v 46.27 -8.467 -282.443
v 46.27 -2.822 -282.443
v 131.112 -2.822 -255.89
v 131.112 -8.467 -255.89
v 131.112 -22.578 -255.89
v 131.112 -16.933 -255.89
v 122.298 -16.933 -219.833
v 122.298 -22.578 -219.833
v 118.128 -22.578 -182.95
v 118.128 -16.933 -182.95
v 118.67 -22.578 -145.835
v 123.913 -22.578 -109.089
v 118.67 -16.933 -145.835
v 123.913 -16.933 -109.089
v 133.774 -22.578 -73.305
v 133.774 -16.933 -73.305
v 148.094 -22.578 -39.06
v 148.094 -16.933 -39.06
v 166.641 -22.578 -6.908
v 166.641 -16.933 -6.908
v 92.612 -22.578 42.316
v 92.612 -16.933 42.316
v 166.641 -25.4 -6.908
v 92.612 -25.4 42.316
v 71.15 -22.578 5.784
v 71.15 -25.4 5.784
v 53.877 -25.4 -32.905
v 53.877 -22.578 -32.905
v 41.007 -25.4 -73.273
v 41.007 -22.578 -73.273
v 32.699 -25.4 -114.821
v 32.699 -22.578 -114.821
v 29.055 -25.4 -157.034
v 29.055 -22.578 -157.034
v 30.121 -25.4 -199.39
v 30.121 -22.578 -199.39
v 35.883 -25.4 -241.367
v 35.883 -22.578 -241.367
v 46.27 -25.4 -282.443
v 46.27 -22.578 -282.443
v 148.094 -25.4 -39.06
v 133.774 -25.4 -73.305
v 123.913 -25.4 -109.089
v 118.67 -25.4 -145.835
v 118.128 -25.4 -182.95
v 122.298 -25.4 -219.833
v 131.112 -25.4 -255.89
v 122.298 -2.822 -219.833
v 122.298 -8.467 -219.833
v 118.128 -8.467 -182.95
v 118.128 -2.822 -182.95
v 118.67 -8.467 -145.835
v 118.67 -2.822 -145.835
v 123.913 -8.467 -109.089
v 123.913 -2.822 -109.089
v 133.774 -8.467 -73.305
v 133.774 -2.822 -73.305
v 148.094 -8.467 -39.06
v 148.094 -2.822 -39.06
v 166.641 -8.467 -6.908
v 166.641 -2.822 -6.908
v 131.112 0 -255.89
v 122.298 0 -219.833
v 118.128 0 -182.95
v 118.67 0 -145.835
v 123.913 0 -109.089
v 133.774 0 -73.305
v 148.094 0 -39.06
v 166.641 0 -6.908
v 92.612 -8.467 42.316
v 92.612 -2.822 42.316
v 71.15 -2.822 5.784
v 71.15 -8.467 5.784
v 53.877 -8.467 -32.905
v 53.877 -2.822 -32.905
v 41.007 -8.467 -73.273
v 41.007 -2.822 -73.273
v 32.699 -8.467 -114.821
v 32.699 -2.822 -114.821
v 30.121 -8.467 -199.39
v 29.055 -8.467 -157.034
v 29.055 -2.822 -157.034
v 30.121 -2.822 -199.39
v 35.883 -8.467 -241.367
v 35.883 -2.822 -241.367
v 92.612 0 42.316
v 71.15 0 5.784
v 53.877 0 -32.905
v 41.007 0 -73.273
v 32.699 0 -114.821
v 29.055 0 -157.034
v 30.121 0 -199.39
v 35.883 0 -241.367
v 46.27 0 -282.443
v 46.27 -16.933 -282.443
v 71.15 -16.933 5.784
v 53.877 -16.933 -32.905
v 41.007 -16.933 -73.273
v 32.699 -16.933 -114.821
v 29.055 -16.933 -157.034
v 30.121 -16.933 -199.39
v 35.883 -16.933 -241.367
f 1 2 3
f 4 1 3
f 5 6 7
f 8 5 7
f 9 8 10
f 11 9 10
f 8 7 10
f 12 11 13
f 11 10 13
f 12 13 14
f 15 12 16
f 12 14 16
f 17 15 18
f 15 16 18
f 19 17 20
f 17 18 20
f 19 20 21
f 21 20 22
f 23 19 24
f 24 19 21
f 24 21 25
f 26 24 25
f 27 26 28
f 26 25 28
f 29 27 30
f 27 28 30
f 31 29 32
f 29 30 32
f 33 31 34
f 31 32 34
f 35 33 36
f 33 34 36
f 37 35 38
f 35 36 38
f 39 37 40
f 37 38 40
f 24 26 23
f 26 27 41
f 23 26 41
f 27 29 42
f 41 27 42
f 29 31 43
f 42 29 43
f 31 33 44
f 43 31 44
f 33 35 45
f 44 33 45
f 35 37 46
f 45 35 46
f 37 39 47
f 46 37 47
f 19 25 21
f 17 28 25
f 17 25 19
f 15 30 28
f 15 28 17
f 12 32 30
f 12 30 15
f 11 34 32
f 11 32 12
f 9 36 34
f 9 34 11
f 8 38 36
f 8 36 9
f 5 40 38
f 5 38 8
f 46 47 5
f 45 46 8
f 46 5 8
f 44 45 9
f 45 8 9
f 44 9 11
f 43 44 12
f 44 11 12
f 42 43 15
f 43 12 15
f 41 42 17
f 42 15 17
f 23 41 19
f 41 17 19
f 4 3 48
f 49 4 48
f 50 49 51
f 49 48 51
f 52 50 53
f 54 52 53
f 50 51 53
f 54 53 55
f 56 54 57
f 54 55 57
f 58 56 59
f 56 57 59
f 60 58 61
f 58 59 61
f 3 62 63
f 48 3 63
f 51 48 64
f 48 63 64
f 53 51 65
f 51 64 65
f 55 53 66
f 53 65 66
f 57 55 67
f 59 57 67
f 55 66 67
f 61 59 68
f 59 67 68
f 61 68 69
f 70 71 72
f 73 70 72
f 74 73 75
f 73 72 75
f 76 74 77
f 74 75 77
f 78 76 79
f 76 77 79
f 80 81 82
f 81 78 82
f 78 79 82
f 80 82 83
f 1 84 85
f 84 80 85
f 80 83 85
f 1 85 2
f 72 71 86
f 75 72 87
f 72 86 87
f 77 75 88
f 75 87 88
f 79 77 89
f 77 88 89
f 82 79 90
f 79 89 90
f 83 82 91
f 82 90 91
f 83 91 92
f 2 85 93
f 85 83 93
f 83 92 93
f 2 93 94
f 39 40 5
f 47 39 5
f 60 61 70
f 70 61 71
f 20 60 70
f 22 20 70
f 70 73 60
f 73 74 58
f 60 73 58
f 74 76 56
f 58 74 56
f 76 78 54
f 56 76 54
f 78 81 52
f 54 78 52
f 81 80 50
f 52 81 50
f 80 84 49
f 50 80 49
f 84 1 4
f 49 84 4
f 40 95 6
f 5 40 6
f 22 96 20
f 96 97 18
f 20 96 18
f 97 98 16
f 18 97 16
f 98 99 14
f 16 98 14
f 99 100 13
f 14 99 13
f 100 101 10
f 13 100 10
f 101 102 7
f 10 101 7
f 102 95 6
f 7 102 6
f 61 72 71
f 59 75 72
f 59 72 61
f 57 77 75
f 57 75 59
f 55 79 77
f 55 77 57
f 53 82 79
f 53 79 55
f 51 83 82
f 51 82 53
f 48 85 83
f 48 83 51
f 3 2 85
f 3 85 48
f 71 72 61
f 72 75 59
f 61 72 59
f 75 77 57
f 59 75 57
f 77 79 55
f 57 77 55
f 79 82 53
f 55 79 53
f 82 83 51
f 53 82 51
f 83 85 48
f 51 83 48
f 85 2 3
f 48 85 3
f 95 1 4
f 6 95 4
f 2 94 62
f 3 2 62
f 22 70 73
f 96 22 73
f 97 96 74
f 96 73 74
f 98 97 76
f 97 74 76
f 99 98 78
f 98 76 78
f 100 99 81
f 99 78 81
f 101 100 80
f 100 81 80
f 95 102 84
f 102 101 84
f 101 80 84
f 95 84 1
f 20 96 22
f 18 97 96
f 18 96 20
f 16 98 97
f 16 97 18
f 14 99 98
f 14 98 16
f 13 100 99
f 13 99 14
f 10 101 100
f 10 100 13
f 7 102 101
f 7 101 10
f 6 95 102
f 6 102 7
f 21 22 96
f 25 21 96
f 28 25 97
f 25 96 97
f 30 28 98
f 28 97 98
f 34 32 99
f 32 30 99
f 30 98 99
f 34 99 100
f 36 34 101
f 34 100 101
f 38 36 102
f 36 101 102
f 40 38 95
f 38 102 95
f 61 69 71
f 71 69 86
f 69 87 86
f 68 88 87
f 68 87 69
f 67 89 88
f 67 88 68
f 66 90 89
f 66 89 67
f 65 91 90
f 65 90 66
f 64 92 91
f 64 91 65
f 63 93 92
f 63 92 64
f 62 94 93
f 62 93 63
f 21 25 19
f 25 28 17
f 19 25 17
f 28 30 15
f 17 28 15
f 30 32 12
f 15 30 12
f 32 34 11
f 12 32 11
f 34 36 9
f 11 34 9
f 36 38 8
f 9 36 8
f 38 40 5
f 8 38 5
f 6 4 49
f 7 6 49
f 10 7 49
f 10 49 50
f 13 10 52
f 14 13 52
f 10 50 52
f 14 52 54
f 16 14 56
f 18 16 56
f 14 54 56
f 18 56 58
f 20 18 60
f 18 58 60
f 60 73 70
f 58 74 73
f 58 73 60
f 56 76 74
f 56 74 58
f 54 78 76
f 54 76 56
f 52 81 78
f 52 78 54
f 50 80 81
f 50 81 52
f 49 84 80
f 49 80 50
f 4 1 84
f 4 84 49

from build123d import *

# Parameters (mm, degrees)
SKETCH3_W                = 609.6
SKETCH3_H                = 1219.2
BOSS_EXTRUDE1_DEPTH      = 25.4
SPLIT1_SURFACE_1_1_BACK  = 1364.344
SPLIT1_SURFACE_1_1_DEPTH = 2728.688
SPLIT1_SURFACE_1_2_BACK  = 1364.344
SPLIT1_SURFACE_1_2_DEPTH = 2728.688
SPLIT1_SURFACE_2_3_BACK  = 1364.344
SPLIT1_SURFACE_2_3_DEPTH = 2728.688
SPLIT1_SURFACE_2_4_BACK  = 1364.344
SPLIT1_SURFACE_2_4_DEPTH = 2728.688
SPLIT1_SURFACE_3_5_BACK  = 1364.344
SPLIT1_SURFACE_3_5_DEPTH = 2728.688
SPLIT1_SURFACE_3_6_BACK  = 1364.344
SPLIT1_SURFACE_3_6_DEPTH = 2728.688
SPLIT1_SURFACE_4_7_BACK  = 1364.344
SPLIT1_SURFACE_4_7_DEPTH = 2728.688
SPLIT1_SURFACE_4_8_BACK  = 1364.344
SPLIT1_SURFACE_4_8_DEPTH = 2728.688
SKETCH6_W                = 609.6
SKETCH6_H                = 1219.2
CUT_EXTRUDE1_DEPTH       = 25.4


with BuildPart() as part:
    # Sketch3 → Boss-Extrude1 (new body)
    with BuildSketch(Plane(origin=(0, 0, 0), x_dir=(1, 0, 0), z_dir=(0, 1, 0))):
        Rectangle(SKETCH3_W, SKETCH3_H)
    extrude(amount=-BOSS_EXTRUDE1_DEPTH)


with BuildPart() as body_2:
    # Split1: the piece behind the surface
    add(part.part)
    # Split1 surface 1: a surface, the sketch's curves swept straight by 2728.688 mm
    with BuildLine(Plane.XY.offset(-SPLIT1_SURFACE_1_1_BACK), mode=Mode.PRIVATE) as split1_surface_1_1_path:
        Line((-335.28, -22.577777778), (335.28, -22.577777778))
    split1_surface_1_1 = Shell.extrude(split1_surface_1_1_path.wire(), (0 * SPLIT1_SURFACE_1_1_DEPTH, 0 * SPLIT1_SURFACE_1_1_DEPTH, 1 * SPLIT1_SURFACE_1_1_DEPTH))
    split(bisect_by=split1_surface_1_1, keep=Keep.BOTTOM)


with BuildPart() as part_1:
    add(part.part)

    # Split1: split by a surface, the side it looks to stays
    # Split1 surface 1: a surface, the sketch's curves swept straight by 2728.688 mm
    with BuildLine(Plane.XY.offset(-SPLIT1_SURFACE_1_2_BACK), mode=Mode.PRIVATE) as split1_surface_1_2_path:
        Line((-335.28, -22.577777778), (335.28, -22.577777778))
    split1_surface_1_2 = Shell.extrude(split1_surface_1_2_path.wire(), (0 * SPLIT1_SURFACE_1_2_DEPTH, 0 * SPLIT1_SURFACE_1_2_DEPTH, 1 * SPLIT1_SURFACE_1_2_DEPTH))
    split(bisect_by=split1_surface_1_2, keep=Keep.TOP)


with BuildPart() as body_3:
    # Split1 2: the piece behind the surface
    add(part_1.part)
    # Split1 surface 2: a surface, the sketch's curves swept straight by 2728.688 mm
    with BuildLine(Plane.XY.offset(-SPLIT1_SURFACE_2_3_BACK), mode=Mode.PRIVATE) as split1_surface_2_3_path:
        Line((-335.28, -16.933333333), (335.28, -16.933333333))
    split1_surface_2_3 = Shell.extrude(split1_surface_2_3_path.wire(), (0 * SPLIT1_SURFACE_2_3_DEPTH, 0 * SPLIT1_SURFACE_2_3_DEPTH, 1 * SPLIT1_SURFACE_2_3_DEPTH))
    split(bisect_by=split1_surface_2_3, keep=Keep.BOTTOM)


with BuildPart() as part_2:
    add(part_1.part)

    # Split1 2: split by a surface, the side it looks to stays
    # Split1 surface 2: a surface, the sketch's curves swept straight by 2728.688 mm
    with BuildLine(Plane.XY.offset(-SPLIT1_SURFACE_2_4_BACK), mode=Mode.PRIVATE) as split1_surface_2_4_path:
        Line((-335.28, -16.933333333), (335.28, -16.933333333))
    split1_surface_2_4 = Shell.extrude(split1_surface_2_4_path.wire(), (0 * SPLIT1_SURFACE_2_4_DEPTH, 0 * SPLIT1_SURFACE_2_4_DEPTH, 1 * SPLIT1_SURFACE_2_4_DEPTH))
    split(bisect_by=split1_surface_2_4, keep=Keep.TOP)


with BuildPart() as body_4_2:
    # Split1 3: the piece behind the surface
    add(part_2.part)
    # Split1 surface 3: a surface, the sketch's curves swept straight by 2728.688 mm
    with BuildLine(Plane.XY.offset(-SPLIT1_SURFACE_3_5_BACK), mode=Mode.PRIVATE) as split1_surface_3_5_path:
        Line((-335.28, -2.822222222), (335.28, -2.822222222))
    split1_surface_3_5 = Shell.extrude(split1_surface_3_5_path.wire(), (0 * SPLIT1_SURFACE_3_5_DEPTH, 0 * SPLIT1_SURFACE_3_5_DEPTH, 1 * SPLIT1_SURFACE_3_5_DEPTH))
    split(bisect_by=split1_surface_3_5, keep=Keep.BOTTOM)


with BuildPart() as part_3:
    add(part_2.part)

    # Split1 3: split by a surface, the side it looks to stays
    # Split1 surface 3: a surface, the sketch's curves swept straight by 2728.688 mm
    with BuildLine(Plane.XY.offset(-SPLIT1_SURFACE_3_6_BACK), mode=Mode.PRIVATE) as split1_surface_3_6_path:
        Line((-335.28, -2.822222222), (335.28, -2.822222222))
    split1_surface_3_6 = Shell.extrude(split1_surface_3_6_path.wire(), (0 * SPLIT1_SURFACE_3_6_DEPTH, 0 * SPLIT1_SURFACE_3_6_DEPTH, 1 * SPLIT1_SURFACE_3_6_DEPTH))
    split(bisect_by=split1_surface_3_6, keep=Keep.TOP)


with BuildPart() as body_5_2:
    # Split1 4 body 4 2: the piece behind the surface
    add(body_4_2.part)
    # Split1 surface 4: a surface, the sketch's curves swept straight by 2728.688 mm
    with BuildLine(Plane.XY.offset(-SPLIT1_SURFACE_4_7_BACK), mode=Mode.PRIVATE) as split1_surface_4_7_path:
        Line((-335.28, -8.466666667), (335.28, -8.466666667))
    split1_surface_4_7 = Shell.extrude(split1_surface_4_7_path.wire(), (0 * SPLIT1_SURFACE_4_7_DEPTH, 0 * SPLIT1_SURFACE_4_7_DEPTH, 1 * SPLIT1_SURFACE_4_7_DEPTH))
    split(bisect_by=split1_surface_4_7, keep=Keep.BOTTOM)


with BuildPart() as body_4_2_1:
    add(body_4_2.part)

    # Split1 4 body 4 2: split by a surface, the side it looks to stays
    # Split1 surface 4: a surface, the sketch's curves swept straight by 2728.688 mm
    with BuildLine(Plane.XY.offset(-SPLIT1_SURFACE_4_8_BACK), mode=Mode.PRIVATE) as split1_surface_4_8_path:
        Line((-335.28, -8.466666667), (335.28, -8.466666667))
    split1_surface_4_8 = Shell.extrude(split1_surface_4_8_path.wire(), (0 * SPLIT1_SURFACE_4_8_DEPTH, 0 * SPLIT1_SURFACE_4_8_DEPTH, 1 * SPLIT1_SURFACE_4_8_DEPTH))
    split(bisect_by=split1_surface_4_8, keep=Keep.TOP)


with BuildPart() as cut_extrude1_tool:
    # Sketch6 → Cut-Extrude1 (new body)
    with BuildSketch(Plane(origin=(0, 0, 0), x_dir=(1, 0, 0), z_dir=(0, 1, 0))):
        Rectangle(SKETCH6_W, SKETCH6_H)
        with BuildLine():
            Line((46.270357382, 282.443495849), (131.11209545, 255.889974774))
            ThreePointArc((131.11209545, 255.889974774), (120.707054174, 127.379073549), (166.640986072, 6.907539493))
            Line((166.640986072, 6.907539493), (92.612388628, -42.316202343))
            ThreePointArc((92.612388628, -42.316202343), (32.698564412, 114.820581208), (46.270357382, 282.443495849))
        make_face(mode=Mode.SUBTRACT)
    extrude(amount=-CUT_EXTRUDE1_DEPTH)


with BuildPart() as part_4:
    add(part_3.part)

    # Cut-Extrude1: cut by cut_extrude1_tool
    add(cut_extrude1_tool.part, mode=Mode.SUBTRACT)


with BuildPart() as body_2_1:
    add(body_2.part)

    # Cut-Extrude1: cut by cut_extrude1_tool
    add(cut_extrude1_tool.part, mode=Mode.SUBTRACT)


with BuildPart() as body_3_1:
    add(body_3.part)

    # Cut-Extrude1: cut by cut_extrude1_tool
    add(cut_extrude1_tool.part, mode=Mode.SUBTRACT)


with BuildPart() as body_4_2_2:
    add(body_4_2_1.part)

    # Cut-Extrude1: cut by cut_extrude1_tool
    add(cut_extrude1_tool.part, mode=Mode.SUBTRACT)


with BuildPart() as body_5_2_1:
    add(body_5_2.part)

    # Cut-Extrude1: cut by cut_extrude1_tool
    add(cut_extrude1_tool.part, mode=Mode.SUBTRACT)


solid = Compound([part_4.part, body_2_1.part, body_3_1.part, body_4_2_2.part, body_5_2_1.part])
